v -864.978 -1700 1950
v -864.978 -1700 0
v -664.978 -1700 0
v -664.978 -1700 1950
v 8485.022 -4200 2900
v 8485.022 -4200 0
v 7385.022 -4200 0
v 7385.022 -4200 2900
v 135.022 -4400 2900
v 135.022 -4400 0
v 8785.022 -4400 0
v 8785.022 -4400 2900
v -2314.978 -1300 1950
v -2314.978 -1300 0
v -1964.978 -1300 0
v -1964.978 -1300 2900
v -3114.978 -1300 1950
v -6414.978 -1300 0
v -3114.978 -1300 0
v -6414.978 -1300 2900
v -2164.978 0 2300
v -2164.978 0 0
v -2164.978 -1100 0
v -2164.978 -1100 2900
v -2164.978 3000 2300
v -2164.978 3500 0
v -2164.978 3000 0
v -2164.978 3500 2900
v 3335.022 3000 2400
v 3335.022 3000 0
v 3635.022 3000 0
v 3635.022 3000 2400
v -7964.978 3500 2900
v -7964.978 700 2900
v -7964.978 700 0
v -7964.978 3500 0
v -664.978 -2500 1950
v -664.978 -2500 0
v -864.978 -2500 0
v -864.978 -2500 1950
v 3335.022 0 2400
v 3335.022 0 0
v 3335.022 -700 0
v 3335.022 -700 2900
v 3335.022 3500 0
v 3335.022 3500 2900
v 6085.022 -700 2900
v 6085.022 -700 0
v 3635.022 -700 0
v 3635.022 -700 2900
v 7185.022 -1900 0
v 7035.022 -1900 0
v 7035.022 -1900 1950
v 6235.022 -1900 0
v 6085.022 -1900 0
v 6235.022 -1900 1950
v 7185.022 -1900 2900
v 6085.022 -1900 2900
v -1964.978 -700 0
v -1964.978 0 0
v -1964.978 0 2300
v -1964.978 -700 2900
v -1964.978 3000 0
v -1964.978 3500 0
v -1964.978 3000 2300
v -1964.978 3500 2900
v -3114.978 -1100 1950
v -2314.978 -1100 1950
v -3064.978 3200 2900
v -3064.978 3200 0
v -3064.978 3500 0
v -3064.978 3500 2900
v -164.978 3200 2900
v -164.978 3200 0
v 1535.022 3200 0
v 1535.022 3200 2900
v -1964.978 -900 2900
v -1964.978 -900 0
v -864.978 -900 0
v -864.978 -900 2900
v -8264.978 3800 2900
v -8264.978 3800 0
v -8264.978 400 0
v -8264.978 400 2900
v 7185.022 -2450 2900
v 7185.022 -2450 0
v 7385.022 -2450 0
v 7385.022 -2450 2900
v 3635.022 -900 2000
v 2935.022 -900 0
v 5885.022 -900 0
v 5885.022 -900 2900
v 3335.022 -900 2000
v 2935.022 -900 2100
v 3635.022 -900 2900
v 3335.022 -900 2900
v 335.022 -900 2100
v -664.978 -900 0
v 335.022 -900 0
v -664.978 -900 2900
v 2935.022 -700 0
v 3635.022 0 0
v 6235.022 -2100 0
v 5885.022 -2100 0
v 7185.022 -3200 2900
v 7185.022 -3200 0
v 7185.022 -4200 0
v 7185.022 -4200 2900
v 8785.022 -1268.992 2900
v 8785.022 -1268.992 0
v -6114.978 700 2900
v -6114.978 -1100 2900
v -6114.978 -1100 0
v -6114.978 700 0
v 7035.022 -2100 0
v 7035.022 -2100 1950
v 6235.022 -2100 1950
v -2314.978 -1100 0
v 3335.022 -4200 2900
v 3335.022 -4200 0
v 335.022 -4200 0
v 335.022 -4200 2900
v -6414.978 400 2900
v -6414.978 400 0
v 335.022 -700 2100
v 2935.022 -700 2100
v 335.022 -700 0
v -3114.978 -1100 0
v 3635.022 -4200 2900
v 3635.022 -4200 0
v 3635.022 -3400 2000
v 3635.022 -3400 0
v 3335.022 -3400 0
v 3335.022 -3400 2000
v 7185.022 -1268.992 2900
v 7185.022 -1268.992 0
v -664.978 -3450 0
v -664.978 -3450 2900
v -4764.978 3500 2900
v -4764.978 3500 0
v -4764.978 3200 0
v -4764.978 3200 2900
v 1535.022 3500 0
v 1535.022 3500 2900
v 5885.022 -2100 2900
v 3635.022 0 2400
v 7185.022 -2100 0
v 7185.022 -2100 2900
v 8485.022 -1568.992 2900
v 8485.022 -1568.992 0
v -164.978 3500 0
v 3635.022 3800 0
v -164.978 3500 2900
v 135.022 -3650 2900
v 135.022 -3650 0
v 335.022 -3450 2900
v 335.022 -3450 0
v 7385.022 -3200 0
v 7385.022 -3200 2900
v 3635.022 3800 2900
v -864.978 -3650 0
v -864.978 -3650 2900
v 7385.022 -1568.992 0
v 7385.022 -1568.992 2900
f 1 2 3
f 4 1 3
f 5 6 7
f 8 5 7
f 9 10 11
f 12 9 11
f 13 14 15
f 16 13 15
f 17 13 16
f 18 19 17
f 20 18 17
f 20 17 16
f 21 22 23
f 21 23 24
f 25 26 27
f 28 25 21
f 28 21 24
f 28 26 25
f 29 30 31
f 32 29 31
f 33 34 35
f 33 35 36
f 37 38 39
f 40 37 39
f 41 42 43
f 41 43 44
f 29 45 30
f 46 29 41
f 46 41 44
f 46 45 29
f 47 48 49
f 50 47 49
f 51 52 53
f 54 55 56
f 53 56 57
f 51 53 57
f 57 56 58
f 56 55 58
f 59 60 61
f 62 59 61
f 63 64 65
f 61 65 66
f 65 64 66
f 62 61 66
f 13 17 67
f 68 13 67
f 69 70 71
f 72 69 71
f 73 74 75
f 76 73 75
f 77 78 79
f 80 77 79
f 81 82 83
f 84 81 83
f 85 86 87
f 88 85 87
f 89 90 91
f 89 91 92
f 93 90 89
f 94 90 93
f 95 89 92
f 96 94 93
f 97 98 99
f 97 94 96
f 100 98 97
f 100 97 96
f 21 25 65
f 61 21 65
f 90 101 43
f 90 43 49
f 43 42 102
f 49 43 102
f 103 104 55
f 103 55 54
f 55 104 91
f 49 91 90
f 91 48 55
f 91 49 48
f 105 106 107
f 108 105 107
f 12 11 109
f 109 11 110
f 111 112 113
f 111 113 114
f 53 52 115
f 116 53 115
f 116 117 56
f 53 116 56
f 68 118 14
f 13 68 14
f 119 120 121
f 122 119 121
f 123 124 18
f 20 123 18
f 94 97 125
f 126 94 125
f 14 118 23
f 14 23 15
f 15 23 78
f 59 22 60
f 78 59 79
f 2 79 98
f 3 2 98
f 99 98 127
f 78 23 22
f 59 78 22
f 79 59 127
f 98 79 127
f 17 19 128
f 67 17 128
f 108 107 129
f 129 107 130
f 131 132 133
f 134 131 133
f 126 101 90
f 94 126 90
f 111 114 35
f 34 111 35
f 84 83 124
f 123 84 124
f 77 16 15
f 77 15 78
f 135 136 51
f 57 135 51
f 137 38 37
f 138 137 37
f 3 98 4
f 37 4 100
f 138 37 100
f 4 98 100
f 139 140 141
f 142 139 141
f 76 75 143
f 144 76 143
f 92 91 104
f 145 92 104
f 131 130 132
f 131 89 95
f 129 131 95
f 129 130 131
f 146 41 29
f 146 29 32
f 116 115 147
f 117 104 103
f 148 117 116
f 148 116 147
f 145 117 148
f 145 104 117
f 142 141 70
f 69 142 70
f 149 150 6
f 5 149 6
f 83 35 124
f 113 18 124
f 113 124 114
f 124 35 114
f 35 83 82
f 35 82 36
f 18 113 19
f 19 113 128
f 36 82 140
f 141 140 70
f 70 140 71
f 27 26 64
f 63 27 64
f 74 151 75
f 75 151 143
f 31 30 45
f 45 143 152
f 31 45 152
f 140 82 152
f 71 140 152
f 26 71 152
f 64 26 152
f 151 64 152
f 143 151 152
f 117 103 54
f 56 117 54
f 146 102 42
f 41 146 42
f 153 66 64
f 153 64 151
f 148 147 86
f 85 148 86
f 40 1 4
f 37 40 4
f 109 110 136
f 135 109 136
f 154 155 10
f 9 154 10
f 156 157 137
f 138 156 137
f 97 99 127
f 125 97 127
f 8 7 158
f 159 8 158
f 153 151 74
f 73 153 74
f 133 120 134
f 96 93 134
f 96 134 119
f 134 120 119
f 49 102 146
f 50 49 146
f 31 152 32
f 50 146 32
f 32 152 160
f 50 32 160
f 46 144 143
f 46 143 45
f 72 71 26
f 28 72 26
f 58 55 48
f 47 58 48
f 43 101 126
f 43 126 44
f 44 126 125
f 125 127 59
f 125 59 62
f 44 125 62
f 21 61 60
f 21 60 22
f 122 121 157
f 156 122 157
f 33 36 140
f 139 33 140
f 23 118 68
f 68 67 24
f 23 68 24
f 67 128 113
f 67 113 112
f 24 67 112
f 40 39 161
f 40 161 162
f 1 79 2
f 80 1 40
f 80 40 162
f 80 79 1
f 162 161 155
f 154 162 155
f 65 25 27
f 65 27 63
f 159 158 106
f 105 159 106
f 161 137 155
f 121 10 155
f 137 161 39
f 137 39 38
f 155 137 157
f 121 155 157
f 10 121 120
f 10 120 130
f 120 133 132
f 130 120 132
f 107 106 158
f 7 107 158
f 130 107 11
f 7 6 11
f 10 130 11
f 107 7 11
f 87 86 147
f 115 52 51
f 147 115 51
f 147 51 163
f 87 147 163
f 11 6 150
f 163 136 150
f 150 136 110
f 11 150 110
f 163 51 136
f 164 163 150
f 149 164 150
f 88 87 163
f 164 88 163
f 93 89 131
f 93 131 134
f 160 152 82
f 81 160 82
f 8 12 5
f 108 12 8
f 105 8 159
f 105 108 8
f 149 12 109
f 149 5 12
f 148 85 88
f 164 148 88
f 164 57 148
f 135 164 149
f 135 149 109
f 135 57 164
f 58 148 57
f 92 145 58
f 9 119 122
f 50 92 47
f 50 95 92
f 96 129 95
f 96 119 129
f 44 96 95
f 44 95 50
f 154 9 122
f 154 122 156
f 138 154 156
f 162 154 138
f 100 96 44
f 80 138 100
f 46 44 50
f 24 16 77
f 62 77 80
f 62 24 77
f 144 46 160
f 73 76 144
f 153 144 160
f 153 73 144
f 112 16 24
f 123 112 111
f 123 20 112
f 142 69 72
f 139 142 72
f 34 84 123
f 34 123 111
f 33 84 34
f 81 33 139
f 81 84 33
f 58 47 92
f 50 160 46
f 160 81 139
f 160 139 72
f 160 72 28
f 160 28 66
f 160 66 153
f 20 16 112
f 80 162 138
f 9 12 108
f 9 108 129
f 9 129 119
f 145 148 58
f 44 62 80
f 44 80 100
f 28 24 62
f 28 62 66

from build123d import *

# Parameters (mm, degrees)
F1_DEPTH  = 2900
F2_W      = 300
F2_H      = 500
F3_DEPTH  = 3000
F4_W      = 200
F4_H      = 600
F5_DEPTH  = 3500
F6_W      = 200
F6_H      = 950
F7_DEPTH  = 1000
F8_W      = 200
F8_H      = 950
F9_DEPTH  = 1000
F10_W     = 200
F10_H     = 800
F11_DEPTH = 3000
F12_W     = 300
F12_H     = 900
F13_DEPTH = 2580
F14_W     = 200
F14_H     = 950
F15_DEPTH = 830


# Not quite as in the source:
# - a feature names something its author has since deleted; it is built from what else it names


with BuildPart() as f1:
    # F0 (on Top) → F1 (new body)
    with BuildSketch(Plane.XY):
        Polygon((3635.0218463784, 3800), (-8264.9781536216, 3800), (-8264.9781536216, 400), (-6414.9781536216, 400), (-6414.9781536216, -1300), (-3114.9781536216, -1300), (-3114.9781536216, -1100), (-6114.9781536216, -1100), (-6114.9781536216, 700), (-7964.9781536216, 700), (-7964.9781536216, 3500), (-4764.9781536216, 3500), (-4764.9781536216, 3200), (-3064.9781536216, 3200), (-3064.9781536216, 3500), (-2164.9781536216, 3500), (-2164.9781536216, 3000), (-1964.9781536216, 3000), (-1964.9781536216, 3500), (-164.9781536216, 3500), (-164.9781536216, 3200), (1535.0218463784, 3200), (1535.0218463784, 3500), (3335.0218463784, 3500), (3335.0218463784, 3000), (3635.0218463784, 3000), align=None)
    extrude(amount=F1_DEPTH)



with BuildPart() as f1b:
    # F0 (on Top) → F1, piece 2 (new body)
    with BuildSketch(Plane.XY):
        Polygon((-2164.9781536216, 0), (-2164.9781536216, -1100), (-2314.9781536216, -1100), (-2314.9781536216, -1300), (-1964.9781536216, -1300), (-1964.9781536216, -900), (-864.9781536216, -900), (-864.9781536216, -1700), (-664.9781536216, -1700), (-664.9781536216, -900), (335.0218463784, -900), (335.0218463784, -700), (-1964.9781536216, -700), (-1964.9781536216, 0), align=None)
    extrude(amount=F1_DEPTH)


with BuildPart() as f1c:
    # F0 (on Top) → F1, piece 3 (new body)
    with BuildSketch(Plane.XY):
        Polygon((3335.0218463784, -700), (2935.0218463784, -700), (2935.0218463784, -900), (5885.0218463784, -900), (5885.0218463784, -2100), (6235.0218463784, -2100), (6235.0218463784, -1900), (6085.0218463784, -1900), (6085.0218463784, -700), (3635.0218463784, -700), (3635.0218463784, 0), (3335.0218463784, 0), align=None)
    extrude(amount=F1_DEPTH)


with BuildPart() as f1d:
    # F0 (on Top) → F1, piece 4 (new body)
    with BuildSketch(Plane.XY):
        Polygon((7185.0218463784, -4200), (3635.0218463784, -4200), (3635.0218463784, -3400), (3335.0218463784, -3400), (3335.0218463784, -4200), (335.0218463784, -4200), (335.0218463784, -3450), (-664.9781536216, -3450), (-664.9781536216, -2500), (-864.9781536216, -2500), (-864.9781536216, -3650), (135.0218463784, -3650), (135.0218463784, -4400), (8785.0218463784, -4400), (8785.0218463784, -1268.9918279648), (7185.0218463784, -1268.9918279648), (7185.0218463784, -1900), (7035.0218463784, -1900), (7035.0218463784, -2100), (7185.0218463784, -2100), (7185.0218463784, -2450), (7385.0218463784, -2450), (7385.0218463784, -1568.9918279648), (8485.0218463784, -1568.9918279648), (8485.0218463784, -4200), (7385.0218463784, -4200), (7385.0218463784, -3200), (7185.0218463784, -3200), align=None)
    extrude(amount=F1_DEPTH)


with BuildPart() as f1_1:
    add(f1.part)

    add(f1c.part)  # F3 merges F1c
    # F2 (on face) → F3 (join)
    with BuildSketch(Plane.XZ.offset(-3000)):
        with Locations((3485.0218463784, 2650)):
            Rectangle(F2_W, F2_H)
    extrude(amount=F3_DEPTH)


    add(f1b.part)  # F5 merges F1b
    # F4 (on face) → F5 (join)
    with BuildSketch(Plane.XZ.offset(-3000)):
        with Locations((-2064.9781536216, 2600)):
            Rectangle(F4_W, F4_H)
    extrude(amount=F5_DEPTH)


    add(f1d.part)  # F7 merges F1d
    # F6 (on face) → F7 (join)
    with BuildSketch(Plane.XZ.offset(1700)):
        with Locations((-764.9781536216, 2425)):
            Rectangle(F6_W, F6_H)
    extrude(amount=F7_DEPTH)

    # F8 (on face) → F9 (join)
    with BuildSketch(Plane.YZ.offset(-3114.9781536216)):
        with Locations((-1200, 2425)):
            Rectangle(F8_W, F8_H)
    extrude(amount=F9_DEPTH)

    # F10 (on face) → F11 (join)
    with BuildSketch(Plane.YZ.offset(335.0218463784)):
        with Locations((-800, 2500)):
            Rectangle(F10_W, F10_H)
    extrude(amount=F11_DEPTH)

    # F12 (on face) → F13 (join)
    with BuildSketch(Plane(origin=(0, -3400, 0), x_dir=(-1, 0, 0), z_dir=(0, 1, 0))):
        with Locations((-3485.0218463784, 2450)):
            Rectangle(F12_W, F12_H)
    extrude(amount=F13_DEPTH)

    # F14 (on face) → F15 (join)
    with BuildSketch(Plane.YZ.offset(6235.0218463784)):
        with Locations((-2000, 2425)):
            Rectangle(F14_W, F14_H)
    extrude(amount=F15_DEPTH)


solid = f1_1.part
